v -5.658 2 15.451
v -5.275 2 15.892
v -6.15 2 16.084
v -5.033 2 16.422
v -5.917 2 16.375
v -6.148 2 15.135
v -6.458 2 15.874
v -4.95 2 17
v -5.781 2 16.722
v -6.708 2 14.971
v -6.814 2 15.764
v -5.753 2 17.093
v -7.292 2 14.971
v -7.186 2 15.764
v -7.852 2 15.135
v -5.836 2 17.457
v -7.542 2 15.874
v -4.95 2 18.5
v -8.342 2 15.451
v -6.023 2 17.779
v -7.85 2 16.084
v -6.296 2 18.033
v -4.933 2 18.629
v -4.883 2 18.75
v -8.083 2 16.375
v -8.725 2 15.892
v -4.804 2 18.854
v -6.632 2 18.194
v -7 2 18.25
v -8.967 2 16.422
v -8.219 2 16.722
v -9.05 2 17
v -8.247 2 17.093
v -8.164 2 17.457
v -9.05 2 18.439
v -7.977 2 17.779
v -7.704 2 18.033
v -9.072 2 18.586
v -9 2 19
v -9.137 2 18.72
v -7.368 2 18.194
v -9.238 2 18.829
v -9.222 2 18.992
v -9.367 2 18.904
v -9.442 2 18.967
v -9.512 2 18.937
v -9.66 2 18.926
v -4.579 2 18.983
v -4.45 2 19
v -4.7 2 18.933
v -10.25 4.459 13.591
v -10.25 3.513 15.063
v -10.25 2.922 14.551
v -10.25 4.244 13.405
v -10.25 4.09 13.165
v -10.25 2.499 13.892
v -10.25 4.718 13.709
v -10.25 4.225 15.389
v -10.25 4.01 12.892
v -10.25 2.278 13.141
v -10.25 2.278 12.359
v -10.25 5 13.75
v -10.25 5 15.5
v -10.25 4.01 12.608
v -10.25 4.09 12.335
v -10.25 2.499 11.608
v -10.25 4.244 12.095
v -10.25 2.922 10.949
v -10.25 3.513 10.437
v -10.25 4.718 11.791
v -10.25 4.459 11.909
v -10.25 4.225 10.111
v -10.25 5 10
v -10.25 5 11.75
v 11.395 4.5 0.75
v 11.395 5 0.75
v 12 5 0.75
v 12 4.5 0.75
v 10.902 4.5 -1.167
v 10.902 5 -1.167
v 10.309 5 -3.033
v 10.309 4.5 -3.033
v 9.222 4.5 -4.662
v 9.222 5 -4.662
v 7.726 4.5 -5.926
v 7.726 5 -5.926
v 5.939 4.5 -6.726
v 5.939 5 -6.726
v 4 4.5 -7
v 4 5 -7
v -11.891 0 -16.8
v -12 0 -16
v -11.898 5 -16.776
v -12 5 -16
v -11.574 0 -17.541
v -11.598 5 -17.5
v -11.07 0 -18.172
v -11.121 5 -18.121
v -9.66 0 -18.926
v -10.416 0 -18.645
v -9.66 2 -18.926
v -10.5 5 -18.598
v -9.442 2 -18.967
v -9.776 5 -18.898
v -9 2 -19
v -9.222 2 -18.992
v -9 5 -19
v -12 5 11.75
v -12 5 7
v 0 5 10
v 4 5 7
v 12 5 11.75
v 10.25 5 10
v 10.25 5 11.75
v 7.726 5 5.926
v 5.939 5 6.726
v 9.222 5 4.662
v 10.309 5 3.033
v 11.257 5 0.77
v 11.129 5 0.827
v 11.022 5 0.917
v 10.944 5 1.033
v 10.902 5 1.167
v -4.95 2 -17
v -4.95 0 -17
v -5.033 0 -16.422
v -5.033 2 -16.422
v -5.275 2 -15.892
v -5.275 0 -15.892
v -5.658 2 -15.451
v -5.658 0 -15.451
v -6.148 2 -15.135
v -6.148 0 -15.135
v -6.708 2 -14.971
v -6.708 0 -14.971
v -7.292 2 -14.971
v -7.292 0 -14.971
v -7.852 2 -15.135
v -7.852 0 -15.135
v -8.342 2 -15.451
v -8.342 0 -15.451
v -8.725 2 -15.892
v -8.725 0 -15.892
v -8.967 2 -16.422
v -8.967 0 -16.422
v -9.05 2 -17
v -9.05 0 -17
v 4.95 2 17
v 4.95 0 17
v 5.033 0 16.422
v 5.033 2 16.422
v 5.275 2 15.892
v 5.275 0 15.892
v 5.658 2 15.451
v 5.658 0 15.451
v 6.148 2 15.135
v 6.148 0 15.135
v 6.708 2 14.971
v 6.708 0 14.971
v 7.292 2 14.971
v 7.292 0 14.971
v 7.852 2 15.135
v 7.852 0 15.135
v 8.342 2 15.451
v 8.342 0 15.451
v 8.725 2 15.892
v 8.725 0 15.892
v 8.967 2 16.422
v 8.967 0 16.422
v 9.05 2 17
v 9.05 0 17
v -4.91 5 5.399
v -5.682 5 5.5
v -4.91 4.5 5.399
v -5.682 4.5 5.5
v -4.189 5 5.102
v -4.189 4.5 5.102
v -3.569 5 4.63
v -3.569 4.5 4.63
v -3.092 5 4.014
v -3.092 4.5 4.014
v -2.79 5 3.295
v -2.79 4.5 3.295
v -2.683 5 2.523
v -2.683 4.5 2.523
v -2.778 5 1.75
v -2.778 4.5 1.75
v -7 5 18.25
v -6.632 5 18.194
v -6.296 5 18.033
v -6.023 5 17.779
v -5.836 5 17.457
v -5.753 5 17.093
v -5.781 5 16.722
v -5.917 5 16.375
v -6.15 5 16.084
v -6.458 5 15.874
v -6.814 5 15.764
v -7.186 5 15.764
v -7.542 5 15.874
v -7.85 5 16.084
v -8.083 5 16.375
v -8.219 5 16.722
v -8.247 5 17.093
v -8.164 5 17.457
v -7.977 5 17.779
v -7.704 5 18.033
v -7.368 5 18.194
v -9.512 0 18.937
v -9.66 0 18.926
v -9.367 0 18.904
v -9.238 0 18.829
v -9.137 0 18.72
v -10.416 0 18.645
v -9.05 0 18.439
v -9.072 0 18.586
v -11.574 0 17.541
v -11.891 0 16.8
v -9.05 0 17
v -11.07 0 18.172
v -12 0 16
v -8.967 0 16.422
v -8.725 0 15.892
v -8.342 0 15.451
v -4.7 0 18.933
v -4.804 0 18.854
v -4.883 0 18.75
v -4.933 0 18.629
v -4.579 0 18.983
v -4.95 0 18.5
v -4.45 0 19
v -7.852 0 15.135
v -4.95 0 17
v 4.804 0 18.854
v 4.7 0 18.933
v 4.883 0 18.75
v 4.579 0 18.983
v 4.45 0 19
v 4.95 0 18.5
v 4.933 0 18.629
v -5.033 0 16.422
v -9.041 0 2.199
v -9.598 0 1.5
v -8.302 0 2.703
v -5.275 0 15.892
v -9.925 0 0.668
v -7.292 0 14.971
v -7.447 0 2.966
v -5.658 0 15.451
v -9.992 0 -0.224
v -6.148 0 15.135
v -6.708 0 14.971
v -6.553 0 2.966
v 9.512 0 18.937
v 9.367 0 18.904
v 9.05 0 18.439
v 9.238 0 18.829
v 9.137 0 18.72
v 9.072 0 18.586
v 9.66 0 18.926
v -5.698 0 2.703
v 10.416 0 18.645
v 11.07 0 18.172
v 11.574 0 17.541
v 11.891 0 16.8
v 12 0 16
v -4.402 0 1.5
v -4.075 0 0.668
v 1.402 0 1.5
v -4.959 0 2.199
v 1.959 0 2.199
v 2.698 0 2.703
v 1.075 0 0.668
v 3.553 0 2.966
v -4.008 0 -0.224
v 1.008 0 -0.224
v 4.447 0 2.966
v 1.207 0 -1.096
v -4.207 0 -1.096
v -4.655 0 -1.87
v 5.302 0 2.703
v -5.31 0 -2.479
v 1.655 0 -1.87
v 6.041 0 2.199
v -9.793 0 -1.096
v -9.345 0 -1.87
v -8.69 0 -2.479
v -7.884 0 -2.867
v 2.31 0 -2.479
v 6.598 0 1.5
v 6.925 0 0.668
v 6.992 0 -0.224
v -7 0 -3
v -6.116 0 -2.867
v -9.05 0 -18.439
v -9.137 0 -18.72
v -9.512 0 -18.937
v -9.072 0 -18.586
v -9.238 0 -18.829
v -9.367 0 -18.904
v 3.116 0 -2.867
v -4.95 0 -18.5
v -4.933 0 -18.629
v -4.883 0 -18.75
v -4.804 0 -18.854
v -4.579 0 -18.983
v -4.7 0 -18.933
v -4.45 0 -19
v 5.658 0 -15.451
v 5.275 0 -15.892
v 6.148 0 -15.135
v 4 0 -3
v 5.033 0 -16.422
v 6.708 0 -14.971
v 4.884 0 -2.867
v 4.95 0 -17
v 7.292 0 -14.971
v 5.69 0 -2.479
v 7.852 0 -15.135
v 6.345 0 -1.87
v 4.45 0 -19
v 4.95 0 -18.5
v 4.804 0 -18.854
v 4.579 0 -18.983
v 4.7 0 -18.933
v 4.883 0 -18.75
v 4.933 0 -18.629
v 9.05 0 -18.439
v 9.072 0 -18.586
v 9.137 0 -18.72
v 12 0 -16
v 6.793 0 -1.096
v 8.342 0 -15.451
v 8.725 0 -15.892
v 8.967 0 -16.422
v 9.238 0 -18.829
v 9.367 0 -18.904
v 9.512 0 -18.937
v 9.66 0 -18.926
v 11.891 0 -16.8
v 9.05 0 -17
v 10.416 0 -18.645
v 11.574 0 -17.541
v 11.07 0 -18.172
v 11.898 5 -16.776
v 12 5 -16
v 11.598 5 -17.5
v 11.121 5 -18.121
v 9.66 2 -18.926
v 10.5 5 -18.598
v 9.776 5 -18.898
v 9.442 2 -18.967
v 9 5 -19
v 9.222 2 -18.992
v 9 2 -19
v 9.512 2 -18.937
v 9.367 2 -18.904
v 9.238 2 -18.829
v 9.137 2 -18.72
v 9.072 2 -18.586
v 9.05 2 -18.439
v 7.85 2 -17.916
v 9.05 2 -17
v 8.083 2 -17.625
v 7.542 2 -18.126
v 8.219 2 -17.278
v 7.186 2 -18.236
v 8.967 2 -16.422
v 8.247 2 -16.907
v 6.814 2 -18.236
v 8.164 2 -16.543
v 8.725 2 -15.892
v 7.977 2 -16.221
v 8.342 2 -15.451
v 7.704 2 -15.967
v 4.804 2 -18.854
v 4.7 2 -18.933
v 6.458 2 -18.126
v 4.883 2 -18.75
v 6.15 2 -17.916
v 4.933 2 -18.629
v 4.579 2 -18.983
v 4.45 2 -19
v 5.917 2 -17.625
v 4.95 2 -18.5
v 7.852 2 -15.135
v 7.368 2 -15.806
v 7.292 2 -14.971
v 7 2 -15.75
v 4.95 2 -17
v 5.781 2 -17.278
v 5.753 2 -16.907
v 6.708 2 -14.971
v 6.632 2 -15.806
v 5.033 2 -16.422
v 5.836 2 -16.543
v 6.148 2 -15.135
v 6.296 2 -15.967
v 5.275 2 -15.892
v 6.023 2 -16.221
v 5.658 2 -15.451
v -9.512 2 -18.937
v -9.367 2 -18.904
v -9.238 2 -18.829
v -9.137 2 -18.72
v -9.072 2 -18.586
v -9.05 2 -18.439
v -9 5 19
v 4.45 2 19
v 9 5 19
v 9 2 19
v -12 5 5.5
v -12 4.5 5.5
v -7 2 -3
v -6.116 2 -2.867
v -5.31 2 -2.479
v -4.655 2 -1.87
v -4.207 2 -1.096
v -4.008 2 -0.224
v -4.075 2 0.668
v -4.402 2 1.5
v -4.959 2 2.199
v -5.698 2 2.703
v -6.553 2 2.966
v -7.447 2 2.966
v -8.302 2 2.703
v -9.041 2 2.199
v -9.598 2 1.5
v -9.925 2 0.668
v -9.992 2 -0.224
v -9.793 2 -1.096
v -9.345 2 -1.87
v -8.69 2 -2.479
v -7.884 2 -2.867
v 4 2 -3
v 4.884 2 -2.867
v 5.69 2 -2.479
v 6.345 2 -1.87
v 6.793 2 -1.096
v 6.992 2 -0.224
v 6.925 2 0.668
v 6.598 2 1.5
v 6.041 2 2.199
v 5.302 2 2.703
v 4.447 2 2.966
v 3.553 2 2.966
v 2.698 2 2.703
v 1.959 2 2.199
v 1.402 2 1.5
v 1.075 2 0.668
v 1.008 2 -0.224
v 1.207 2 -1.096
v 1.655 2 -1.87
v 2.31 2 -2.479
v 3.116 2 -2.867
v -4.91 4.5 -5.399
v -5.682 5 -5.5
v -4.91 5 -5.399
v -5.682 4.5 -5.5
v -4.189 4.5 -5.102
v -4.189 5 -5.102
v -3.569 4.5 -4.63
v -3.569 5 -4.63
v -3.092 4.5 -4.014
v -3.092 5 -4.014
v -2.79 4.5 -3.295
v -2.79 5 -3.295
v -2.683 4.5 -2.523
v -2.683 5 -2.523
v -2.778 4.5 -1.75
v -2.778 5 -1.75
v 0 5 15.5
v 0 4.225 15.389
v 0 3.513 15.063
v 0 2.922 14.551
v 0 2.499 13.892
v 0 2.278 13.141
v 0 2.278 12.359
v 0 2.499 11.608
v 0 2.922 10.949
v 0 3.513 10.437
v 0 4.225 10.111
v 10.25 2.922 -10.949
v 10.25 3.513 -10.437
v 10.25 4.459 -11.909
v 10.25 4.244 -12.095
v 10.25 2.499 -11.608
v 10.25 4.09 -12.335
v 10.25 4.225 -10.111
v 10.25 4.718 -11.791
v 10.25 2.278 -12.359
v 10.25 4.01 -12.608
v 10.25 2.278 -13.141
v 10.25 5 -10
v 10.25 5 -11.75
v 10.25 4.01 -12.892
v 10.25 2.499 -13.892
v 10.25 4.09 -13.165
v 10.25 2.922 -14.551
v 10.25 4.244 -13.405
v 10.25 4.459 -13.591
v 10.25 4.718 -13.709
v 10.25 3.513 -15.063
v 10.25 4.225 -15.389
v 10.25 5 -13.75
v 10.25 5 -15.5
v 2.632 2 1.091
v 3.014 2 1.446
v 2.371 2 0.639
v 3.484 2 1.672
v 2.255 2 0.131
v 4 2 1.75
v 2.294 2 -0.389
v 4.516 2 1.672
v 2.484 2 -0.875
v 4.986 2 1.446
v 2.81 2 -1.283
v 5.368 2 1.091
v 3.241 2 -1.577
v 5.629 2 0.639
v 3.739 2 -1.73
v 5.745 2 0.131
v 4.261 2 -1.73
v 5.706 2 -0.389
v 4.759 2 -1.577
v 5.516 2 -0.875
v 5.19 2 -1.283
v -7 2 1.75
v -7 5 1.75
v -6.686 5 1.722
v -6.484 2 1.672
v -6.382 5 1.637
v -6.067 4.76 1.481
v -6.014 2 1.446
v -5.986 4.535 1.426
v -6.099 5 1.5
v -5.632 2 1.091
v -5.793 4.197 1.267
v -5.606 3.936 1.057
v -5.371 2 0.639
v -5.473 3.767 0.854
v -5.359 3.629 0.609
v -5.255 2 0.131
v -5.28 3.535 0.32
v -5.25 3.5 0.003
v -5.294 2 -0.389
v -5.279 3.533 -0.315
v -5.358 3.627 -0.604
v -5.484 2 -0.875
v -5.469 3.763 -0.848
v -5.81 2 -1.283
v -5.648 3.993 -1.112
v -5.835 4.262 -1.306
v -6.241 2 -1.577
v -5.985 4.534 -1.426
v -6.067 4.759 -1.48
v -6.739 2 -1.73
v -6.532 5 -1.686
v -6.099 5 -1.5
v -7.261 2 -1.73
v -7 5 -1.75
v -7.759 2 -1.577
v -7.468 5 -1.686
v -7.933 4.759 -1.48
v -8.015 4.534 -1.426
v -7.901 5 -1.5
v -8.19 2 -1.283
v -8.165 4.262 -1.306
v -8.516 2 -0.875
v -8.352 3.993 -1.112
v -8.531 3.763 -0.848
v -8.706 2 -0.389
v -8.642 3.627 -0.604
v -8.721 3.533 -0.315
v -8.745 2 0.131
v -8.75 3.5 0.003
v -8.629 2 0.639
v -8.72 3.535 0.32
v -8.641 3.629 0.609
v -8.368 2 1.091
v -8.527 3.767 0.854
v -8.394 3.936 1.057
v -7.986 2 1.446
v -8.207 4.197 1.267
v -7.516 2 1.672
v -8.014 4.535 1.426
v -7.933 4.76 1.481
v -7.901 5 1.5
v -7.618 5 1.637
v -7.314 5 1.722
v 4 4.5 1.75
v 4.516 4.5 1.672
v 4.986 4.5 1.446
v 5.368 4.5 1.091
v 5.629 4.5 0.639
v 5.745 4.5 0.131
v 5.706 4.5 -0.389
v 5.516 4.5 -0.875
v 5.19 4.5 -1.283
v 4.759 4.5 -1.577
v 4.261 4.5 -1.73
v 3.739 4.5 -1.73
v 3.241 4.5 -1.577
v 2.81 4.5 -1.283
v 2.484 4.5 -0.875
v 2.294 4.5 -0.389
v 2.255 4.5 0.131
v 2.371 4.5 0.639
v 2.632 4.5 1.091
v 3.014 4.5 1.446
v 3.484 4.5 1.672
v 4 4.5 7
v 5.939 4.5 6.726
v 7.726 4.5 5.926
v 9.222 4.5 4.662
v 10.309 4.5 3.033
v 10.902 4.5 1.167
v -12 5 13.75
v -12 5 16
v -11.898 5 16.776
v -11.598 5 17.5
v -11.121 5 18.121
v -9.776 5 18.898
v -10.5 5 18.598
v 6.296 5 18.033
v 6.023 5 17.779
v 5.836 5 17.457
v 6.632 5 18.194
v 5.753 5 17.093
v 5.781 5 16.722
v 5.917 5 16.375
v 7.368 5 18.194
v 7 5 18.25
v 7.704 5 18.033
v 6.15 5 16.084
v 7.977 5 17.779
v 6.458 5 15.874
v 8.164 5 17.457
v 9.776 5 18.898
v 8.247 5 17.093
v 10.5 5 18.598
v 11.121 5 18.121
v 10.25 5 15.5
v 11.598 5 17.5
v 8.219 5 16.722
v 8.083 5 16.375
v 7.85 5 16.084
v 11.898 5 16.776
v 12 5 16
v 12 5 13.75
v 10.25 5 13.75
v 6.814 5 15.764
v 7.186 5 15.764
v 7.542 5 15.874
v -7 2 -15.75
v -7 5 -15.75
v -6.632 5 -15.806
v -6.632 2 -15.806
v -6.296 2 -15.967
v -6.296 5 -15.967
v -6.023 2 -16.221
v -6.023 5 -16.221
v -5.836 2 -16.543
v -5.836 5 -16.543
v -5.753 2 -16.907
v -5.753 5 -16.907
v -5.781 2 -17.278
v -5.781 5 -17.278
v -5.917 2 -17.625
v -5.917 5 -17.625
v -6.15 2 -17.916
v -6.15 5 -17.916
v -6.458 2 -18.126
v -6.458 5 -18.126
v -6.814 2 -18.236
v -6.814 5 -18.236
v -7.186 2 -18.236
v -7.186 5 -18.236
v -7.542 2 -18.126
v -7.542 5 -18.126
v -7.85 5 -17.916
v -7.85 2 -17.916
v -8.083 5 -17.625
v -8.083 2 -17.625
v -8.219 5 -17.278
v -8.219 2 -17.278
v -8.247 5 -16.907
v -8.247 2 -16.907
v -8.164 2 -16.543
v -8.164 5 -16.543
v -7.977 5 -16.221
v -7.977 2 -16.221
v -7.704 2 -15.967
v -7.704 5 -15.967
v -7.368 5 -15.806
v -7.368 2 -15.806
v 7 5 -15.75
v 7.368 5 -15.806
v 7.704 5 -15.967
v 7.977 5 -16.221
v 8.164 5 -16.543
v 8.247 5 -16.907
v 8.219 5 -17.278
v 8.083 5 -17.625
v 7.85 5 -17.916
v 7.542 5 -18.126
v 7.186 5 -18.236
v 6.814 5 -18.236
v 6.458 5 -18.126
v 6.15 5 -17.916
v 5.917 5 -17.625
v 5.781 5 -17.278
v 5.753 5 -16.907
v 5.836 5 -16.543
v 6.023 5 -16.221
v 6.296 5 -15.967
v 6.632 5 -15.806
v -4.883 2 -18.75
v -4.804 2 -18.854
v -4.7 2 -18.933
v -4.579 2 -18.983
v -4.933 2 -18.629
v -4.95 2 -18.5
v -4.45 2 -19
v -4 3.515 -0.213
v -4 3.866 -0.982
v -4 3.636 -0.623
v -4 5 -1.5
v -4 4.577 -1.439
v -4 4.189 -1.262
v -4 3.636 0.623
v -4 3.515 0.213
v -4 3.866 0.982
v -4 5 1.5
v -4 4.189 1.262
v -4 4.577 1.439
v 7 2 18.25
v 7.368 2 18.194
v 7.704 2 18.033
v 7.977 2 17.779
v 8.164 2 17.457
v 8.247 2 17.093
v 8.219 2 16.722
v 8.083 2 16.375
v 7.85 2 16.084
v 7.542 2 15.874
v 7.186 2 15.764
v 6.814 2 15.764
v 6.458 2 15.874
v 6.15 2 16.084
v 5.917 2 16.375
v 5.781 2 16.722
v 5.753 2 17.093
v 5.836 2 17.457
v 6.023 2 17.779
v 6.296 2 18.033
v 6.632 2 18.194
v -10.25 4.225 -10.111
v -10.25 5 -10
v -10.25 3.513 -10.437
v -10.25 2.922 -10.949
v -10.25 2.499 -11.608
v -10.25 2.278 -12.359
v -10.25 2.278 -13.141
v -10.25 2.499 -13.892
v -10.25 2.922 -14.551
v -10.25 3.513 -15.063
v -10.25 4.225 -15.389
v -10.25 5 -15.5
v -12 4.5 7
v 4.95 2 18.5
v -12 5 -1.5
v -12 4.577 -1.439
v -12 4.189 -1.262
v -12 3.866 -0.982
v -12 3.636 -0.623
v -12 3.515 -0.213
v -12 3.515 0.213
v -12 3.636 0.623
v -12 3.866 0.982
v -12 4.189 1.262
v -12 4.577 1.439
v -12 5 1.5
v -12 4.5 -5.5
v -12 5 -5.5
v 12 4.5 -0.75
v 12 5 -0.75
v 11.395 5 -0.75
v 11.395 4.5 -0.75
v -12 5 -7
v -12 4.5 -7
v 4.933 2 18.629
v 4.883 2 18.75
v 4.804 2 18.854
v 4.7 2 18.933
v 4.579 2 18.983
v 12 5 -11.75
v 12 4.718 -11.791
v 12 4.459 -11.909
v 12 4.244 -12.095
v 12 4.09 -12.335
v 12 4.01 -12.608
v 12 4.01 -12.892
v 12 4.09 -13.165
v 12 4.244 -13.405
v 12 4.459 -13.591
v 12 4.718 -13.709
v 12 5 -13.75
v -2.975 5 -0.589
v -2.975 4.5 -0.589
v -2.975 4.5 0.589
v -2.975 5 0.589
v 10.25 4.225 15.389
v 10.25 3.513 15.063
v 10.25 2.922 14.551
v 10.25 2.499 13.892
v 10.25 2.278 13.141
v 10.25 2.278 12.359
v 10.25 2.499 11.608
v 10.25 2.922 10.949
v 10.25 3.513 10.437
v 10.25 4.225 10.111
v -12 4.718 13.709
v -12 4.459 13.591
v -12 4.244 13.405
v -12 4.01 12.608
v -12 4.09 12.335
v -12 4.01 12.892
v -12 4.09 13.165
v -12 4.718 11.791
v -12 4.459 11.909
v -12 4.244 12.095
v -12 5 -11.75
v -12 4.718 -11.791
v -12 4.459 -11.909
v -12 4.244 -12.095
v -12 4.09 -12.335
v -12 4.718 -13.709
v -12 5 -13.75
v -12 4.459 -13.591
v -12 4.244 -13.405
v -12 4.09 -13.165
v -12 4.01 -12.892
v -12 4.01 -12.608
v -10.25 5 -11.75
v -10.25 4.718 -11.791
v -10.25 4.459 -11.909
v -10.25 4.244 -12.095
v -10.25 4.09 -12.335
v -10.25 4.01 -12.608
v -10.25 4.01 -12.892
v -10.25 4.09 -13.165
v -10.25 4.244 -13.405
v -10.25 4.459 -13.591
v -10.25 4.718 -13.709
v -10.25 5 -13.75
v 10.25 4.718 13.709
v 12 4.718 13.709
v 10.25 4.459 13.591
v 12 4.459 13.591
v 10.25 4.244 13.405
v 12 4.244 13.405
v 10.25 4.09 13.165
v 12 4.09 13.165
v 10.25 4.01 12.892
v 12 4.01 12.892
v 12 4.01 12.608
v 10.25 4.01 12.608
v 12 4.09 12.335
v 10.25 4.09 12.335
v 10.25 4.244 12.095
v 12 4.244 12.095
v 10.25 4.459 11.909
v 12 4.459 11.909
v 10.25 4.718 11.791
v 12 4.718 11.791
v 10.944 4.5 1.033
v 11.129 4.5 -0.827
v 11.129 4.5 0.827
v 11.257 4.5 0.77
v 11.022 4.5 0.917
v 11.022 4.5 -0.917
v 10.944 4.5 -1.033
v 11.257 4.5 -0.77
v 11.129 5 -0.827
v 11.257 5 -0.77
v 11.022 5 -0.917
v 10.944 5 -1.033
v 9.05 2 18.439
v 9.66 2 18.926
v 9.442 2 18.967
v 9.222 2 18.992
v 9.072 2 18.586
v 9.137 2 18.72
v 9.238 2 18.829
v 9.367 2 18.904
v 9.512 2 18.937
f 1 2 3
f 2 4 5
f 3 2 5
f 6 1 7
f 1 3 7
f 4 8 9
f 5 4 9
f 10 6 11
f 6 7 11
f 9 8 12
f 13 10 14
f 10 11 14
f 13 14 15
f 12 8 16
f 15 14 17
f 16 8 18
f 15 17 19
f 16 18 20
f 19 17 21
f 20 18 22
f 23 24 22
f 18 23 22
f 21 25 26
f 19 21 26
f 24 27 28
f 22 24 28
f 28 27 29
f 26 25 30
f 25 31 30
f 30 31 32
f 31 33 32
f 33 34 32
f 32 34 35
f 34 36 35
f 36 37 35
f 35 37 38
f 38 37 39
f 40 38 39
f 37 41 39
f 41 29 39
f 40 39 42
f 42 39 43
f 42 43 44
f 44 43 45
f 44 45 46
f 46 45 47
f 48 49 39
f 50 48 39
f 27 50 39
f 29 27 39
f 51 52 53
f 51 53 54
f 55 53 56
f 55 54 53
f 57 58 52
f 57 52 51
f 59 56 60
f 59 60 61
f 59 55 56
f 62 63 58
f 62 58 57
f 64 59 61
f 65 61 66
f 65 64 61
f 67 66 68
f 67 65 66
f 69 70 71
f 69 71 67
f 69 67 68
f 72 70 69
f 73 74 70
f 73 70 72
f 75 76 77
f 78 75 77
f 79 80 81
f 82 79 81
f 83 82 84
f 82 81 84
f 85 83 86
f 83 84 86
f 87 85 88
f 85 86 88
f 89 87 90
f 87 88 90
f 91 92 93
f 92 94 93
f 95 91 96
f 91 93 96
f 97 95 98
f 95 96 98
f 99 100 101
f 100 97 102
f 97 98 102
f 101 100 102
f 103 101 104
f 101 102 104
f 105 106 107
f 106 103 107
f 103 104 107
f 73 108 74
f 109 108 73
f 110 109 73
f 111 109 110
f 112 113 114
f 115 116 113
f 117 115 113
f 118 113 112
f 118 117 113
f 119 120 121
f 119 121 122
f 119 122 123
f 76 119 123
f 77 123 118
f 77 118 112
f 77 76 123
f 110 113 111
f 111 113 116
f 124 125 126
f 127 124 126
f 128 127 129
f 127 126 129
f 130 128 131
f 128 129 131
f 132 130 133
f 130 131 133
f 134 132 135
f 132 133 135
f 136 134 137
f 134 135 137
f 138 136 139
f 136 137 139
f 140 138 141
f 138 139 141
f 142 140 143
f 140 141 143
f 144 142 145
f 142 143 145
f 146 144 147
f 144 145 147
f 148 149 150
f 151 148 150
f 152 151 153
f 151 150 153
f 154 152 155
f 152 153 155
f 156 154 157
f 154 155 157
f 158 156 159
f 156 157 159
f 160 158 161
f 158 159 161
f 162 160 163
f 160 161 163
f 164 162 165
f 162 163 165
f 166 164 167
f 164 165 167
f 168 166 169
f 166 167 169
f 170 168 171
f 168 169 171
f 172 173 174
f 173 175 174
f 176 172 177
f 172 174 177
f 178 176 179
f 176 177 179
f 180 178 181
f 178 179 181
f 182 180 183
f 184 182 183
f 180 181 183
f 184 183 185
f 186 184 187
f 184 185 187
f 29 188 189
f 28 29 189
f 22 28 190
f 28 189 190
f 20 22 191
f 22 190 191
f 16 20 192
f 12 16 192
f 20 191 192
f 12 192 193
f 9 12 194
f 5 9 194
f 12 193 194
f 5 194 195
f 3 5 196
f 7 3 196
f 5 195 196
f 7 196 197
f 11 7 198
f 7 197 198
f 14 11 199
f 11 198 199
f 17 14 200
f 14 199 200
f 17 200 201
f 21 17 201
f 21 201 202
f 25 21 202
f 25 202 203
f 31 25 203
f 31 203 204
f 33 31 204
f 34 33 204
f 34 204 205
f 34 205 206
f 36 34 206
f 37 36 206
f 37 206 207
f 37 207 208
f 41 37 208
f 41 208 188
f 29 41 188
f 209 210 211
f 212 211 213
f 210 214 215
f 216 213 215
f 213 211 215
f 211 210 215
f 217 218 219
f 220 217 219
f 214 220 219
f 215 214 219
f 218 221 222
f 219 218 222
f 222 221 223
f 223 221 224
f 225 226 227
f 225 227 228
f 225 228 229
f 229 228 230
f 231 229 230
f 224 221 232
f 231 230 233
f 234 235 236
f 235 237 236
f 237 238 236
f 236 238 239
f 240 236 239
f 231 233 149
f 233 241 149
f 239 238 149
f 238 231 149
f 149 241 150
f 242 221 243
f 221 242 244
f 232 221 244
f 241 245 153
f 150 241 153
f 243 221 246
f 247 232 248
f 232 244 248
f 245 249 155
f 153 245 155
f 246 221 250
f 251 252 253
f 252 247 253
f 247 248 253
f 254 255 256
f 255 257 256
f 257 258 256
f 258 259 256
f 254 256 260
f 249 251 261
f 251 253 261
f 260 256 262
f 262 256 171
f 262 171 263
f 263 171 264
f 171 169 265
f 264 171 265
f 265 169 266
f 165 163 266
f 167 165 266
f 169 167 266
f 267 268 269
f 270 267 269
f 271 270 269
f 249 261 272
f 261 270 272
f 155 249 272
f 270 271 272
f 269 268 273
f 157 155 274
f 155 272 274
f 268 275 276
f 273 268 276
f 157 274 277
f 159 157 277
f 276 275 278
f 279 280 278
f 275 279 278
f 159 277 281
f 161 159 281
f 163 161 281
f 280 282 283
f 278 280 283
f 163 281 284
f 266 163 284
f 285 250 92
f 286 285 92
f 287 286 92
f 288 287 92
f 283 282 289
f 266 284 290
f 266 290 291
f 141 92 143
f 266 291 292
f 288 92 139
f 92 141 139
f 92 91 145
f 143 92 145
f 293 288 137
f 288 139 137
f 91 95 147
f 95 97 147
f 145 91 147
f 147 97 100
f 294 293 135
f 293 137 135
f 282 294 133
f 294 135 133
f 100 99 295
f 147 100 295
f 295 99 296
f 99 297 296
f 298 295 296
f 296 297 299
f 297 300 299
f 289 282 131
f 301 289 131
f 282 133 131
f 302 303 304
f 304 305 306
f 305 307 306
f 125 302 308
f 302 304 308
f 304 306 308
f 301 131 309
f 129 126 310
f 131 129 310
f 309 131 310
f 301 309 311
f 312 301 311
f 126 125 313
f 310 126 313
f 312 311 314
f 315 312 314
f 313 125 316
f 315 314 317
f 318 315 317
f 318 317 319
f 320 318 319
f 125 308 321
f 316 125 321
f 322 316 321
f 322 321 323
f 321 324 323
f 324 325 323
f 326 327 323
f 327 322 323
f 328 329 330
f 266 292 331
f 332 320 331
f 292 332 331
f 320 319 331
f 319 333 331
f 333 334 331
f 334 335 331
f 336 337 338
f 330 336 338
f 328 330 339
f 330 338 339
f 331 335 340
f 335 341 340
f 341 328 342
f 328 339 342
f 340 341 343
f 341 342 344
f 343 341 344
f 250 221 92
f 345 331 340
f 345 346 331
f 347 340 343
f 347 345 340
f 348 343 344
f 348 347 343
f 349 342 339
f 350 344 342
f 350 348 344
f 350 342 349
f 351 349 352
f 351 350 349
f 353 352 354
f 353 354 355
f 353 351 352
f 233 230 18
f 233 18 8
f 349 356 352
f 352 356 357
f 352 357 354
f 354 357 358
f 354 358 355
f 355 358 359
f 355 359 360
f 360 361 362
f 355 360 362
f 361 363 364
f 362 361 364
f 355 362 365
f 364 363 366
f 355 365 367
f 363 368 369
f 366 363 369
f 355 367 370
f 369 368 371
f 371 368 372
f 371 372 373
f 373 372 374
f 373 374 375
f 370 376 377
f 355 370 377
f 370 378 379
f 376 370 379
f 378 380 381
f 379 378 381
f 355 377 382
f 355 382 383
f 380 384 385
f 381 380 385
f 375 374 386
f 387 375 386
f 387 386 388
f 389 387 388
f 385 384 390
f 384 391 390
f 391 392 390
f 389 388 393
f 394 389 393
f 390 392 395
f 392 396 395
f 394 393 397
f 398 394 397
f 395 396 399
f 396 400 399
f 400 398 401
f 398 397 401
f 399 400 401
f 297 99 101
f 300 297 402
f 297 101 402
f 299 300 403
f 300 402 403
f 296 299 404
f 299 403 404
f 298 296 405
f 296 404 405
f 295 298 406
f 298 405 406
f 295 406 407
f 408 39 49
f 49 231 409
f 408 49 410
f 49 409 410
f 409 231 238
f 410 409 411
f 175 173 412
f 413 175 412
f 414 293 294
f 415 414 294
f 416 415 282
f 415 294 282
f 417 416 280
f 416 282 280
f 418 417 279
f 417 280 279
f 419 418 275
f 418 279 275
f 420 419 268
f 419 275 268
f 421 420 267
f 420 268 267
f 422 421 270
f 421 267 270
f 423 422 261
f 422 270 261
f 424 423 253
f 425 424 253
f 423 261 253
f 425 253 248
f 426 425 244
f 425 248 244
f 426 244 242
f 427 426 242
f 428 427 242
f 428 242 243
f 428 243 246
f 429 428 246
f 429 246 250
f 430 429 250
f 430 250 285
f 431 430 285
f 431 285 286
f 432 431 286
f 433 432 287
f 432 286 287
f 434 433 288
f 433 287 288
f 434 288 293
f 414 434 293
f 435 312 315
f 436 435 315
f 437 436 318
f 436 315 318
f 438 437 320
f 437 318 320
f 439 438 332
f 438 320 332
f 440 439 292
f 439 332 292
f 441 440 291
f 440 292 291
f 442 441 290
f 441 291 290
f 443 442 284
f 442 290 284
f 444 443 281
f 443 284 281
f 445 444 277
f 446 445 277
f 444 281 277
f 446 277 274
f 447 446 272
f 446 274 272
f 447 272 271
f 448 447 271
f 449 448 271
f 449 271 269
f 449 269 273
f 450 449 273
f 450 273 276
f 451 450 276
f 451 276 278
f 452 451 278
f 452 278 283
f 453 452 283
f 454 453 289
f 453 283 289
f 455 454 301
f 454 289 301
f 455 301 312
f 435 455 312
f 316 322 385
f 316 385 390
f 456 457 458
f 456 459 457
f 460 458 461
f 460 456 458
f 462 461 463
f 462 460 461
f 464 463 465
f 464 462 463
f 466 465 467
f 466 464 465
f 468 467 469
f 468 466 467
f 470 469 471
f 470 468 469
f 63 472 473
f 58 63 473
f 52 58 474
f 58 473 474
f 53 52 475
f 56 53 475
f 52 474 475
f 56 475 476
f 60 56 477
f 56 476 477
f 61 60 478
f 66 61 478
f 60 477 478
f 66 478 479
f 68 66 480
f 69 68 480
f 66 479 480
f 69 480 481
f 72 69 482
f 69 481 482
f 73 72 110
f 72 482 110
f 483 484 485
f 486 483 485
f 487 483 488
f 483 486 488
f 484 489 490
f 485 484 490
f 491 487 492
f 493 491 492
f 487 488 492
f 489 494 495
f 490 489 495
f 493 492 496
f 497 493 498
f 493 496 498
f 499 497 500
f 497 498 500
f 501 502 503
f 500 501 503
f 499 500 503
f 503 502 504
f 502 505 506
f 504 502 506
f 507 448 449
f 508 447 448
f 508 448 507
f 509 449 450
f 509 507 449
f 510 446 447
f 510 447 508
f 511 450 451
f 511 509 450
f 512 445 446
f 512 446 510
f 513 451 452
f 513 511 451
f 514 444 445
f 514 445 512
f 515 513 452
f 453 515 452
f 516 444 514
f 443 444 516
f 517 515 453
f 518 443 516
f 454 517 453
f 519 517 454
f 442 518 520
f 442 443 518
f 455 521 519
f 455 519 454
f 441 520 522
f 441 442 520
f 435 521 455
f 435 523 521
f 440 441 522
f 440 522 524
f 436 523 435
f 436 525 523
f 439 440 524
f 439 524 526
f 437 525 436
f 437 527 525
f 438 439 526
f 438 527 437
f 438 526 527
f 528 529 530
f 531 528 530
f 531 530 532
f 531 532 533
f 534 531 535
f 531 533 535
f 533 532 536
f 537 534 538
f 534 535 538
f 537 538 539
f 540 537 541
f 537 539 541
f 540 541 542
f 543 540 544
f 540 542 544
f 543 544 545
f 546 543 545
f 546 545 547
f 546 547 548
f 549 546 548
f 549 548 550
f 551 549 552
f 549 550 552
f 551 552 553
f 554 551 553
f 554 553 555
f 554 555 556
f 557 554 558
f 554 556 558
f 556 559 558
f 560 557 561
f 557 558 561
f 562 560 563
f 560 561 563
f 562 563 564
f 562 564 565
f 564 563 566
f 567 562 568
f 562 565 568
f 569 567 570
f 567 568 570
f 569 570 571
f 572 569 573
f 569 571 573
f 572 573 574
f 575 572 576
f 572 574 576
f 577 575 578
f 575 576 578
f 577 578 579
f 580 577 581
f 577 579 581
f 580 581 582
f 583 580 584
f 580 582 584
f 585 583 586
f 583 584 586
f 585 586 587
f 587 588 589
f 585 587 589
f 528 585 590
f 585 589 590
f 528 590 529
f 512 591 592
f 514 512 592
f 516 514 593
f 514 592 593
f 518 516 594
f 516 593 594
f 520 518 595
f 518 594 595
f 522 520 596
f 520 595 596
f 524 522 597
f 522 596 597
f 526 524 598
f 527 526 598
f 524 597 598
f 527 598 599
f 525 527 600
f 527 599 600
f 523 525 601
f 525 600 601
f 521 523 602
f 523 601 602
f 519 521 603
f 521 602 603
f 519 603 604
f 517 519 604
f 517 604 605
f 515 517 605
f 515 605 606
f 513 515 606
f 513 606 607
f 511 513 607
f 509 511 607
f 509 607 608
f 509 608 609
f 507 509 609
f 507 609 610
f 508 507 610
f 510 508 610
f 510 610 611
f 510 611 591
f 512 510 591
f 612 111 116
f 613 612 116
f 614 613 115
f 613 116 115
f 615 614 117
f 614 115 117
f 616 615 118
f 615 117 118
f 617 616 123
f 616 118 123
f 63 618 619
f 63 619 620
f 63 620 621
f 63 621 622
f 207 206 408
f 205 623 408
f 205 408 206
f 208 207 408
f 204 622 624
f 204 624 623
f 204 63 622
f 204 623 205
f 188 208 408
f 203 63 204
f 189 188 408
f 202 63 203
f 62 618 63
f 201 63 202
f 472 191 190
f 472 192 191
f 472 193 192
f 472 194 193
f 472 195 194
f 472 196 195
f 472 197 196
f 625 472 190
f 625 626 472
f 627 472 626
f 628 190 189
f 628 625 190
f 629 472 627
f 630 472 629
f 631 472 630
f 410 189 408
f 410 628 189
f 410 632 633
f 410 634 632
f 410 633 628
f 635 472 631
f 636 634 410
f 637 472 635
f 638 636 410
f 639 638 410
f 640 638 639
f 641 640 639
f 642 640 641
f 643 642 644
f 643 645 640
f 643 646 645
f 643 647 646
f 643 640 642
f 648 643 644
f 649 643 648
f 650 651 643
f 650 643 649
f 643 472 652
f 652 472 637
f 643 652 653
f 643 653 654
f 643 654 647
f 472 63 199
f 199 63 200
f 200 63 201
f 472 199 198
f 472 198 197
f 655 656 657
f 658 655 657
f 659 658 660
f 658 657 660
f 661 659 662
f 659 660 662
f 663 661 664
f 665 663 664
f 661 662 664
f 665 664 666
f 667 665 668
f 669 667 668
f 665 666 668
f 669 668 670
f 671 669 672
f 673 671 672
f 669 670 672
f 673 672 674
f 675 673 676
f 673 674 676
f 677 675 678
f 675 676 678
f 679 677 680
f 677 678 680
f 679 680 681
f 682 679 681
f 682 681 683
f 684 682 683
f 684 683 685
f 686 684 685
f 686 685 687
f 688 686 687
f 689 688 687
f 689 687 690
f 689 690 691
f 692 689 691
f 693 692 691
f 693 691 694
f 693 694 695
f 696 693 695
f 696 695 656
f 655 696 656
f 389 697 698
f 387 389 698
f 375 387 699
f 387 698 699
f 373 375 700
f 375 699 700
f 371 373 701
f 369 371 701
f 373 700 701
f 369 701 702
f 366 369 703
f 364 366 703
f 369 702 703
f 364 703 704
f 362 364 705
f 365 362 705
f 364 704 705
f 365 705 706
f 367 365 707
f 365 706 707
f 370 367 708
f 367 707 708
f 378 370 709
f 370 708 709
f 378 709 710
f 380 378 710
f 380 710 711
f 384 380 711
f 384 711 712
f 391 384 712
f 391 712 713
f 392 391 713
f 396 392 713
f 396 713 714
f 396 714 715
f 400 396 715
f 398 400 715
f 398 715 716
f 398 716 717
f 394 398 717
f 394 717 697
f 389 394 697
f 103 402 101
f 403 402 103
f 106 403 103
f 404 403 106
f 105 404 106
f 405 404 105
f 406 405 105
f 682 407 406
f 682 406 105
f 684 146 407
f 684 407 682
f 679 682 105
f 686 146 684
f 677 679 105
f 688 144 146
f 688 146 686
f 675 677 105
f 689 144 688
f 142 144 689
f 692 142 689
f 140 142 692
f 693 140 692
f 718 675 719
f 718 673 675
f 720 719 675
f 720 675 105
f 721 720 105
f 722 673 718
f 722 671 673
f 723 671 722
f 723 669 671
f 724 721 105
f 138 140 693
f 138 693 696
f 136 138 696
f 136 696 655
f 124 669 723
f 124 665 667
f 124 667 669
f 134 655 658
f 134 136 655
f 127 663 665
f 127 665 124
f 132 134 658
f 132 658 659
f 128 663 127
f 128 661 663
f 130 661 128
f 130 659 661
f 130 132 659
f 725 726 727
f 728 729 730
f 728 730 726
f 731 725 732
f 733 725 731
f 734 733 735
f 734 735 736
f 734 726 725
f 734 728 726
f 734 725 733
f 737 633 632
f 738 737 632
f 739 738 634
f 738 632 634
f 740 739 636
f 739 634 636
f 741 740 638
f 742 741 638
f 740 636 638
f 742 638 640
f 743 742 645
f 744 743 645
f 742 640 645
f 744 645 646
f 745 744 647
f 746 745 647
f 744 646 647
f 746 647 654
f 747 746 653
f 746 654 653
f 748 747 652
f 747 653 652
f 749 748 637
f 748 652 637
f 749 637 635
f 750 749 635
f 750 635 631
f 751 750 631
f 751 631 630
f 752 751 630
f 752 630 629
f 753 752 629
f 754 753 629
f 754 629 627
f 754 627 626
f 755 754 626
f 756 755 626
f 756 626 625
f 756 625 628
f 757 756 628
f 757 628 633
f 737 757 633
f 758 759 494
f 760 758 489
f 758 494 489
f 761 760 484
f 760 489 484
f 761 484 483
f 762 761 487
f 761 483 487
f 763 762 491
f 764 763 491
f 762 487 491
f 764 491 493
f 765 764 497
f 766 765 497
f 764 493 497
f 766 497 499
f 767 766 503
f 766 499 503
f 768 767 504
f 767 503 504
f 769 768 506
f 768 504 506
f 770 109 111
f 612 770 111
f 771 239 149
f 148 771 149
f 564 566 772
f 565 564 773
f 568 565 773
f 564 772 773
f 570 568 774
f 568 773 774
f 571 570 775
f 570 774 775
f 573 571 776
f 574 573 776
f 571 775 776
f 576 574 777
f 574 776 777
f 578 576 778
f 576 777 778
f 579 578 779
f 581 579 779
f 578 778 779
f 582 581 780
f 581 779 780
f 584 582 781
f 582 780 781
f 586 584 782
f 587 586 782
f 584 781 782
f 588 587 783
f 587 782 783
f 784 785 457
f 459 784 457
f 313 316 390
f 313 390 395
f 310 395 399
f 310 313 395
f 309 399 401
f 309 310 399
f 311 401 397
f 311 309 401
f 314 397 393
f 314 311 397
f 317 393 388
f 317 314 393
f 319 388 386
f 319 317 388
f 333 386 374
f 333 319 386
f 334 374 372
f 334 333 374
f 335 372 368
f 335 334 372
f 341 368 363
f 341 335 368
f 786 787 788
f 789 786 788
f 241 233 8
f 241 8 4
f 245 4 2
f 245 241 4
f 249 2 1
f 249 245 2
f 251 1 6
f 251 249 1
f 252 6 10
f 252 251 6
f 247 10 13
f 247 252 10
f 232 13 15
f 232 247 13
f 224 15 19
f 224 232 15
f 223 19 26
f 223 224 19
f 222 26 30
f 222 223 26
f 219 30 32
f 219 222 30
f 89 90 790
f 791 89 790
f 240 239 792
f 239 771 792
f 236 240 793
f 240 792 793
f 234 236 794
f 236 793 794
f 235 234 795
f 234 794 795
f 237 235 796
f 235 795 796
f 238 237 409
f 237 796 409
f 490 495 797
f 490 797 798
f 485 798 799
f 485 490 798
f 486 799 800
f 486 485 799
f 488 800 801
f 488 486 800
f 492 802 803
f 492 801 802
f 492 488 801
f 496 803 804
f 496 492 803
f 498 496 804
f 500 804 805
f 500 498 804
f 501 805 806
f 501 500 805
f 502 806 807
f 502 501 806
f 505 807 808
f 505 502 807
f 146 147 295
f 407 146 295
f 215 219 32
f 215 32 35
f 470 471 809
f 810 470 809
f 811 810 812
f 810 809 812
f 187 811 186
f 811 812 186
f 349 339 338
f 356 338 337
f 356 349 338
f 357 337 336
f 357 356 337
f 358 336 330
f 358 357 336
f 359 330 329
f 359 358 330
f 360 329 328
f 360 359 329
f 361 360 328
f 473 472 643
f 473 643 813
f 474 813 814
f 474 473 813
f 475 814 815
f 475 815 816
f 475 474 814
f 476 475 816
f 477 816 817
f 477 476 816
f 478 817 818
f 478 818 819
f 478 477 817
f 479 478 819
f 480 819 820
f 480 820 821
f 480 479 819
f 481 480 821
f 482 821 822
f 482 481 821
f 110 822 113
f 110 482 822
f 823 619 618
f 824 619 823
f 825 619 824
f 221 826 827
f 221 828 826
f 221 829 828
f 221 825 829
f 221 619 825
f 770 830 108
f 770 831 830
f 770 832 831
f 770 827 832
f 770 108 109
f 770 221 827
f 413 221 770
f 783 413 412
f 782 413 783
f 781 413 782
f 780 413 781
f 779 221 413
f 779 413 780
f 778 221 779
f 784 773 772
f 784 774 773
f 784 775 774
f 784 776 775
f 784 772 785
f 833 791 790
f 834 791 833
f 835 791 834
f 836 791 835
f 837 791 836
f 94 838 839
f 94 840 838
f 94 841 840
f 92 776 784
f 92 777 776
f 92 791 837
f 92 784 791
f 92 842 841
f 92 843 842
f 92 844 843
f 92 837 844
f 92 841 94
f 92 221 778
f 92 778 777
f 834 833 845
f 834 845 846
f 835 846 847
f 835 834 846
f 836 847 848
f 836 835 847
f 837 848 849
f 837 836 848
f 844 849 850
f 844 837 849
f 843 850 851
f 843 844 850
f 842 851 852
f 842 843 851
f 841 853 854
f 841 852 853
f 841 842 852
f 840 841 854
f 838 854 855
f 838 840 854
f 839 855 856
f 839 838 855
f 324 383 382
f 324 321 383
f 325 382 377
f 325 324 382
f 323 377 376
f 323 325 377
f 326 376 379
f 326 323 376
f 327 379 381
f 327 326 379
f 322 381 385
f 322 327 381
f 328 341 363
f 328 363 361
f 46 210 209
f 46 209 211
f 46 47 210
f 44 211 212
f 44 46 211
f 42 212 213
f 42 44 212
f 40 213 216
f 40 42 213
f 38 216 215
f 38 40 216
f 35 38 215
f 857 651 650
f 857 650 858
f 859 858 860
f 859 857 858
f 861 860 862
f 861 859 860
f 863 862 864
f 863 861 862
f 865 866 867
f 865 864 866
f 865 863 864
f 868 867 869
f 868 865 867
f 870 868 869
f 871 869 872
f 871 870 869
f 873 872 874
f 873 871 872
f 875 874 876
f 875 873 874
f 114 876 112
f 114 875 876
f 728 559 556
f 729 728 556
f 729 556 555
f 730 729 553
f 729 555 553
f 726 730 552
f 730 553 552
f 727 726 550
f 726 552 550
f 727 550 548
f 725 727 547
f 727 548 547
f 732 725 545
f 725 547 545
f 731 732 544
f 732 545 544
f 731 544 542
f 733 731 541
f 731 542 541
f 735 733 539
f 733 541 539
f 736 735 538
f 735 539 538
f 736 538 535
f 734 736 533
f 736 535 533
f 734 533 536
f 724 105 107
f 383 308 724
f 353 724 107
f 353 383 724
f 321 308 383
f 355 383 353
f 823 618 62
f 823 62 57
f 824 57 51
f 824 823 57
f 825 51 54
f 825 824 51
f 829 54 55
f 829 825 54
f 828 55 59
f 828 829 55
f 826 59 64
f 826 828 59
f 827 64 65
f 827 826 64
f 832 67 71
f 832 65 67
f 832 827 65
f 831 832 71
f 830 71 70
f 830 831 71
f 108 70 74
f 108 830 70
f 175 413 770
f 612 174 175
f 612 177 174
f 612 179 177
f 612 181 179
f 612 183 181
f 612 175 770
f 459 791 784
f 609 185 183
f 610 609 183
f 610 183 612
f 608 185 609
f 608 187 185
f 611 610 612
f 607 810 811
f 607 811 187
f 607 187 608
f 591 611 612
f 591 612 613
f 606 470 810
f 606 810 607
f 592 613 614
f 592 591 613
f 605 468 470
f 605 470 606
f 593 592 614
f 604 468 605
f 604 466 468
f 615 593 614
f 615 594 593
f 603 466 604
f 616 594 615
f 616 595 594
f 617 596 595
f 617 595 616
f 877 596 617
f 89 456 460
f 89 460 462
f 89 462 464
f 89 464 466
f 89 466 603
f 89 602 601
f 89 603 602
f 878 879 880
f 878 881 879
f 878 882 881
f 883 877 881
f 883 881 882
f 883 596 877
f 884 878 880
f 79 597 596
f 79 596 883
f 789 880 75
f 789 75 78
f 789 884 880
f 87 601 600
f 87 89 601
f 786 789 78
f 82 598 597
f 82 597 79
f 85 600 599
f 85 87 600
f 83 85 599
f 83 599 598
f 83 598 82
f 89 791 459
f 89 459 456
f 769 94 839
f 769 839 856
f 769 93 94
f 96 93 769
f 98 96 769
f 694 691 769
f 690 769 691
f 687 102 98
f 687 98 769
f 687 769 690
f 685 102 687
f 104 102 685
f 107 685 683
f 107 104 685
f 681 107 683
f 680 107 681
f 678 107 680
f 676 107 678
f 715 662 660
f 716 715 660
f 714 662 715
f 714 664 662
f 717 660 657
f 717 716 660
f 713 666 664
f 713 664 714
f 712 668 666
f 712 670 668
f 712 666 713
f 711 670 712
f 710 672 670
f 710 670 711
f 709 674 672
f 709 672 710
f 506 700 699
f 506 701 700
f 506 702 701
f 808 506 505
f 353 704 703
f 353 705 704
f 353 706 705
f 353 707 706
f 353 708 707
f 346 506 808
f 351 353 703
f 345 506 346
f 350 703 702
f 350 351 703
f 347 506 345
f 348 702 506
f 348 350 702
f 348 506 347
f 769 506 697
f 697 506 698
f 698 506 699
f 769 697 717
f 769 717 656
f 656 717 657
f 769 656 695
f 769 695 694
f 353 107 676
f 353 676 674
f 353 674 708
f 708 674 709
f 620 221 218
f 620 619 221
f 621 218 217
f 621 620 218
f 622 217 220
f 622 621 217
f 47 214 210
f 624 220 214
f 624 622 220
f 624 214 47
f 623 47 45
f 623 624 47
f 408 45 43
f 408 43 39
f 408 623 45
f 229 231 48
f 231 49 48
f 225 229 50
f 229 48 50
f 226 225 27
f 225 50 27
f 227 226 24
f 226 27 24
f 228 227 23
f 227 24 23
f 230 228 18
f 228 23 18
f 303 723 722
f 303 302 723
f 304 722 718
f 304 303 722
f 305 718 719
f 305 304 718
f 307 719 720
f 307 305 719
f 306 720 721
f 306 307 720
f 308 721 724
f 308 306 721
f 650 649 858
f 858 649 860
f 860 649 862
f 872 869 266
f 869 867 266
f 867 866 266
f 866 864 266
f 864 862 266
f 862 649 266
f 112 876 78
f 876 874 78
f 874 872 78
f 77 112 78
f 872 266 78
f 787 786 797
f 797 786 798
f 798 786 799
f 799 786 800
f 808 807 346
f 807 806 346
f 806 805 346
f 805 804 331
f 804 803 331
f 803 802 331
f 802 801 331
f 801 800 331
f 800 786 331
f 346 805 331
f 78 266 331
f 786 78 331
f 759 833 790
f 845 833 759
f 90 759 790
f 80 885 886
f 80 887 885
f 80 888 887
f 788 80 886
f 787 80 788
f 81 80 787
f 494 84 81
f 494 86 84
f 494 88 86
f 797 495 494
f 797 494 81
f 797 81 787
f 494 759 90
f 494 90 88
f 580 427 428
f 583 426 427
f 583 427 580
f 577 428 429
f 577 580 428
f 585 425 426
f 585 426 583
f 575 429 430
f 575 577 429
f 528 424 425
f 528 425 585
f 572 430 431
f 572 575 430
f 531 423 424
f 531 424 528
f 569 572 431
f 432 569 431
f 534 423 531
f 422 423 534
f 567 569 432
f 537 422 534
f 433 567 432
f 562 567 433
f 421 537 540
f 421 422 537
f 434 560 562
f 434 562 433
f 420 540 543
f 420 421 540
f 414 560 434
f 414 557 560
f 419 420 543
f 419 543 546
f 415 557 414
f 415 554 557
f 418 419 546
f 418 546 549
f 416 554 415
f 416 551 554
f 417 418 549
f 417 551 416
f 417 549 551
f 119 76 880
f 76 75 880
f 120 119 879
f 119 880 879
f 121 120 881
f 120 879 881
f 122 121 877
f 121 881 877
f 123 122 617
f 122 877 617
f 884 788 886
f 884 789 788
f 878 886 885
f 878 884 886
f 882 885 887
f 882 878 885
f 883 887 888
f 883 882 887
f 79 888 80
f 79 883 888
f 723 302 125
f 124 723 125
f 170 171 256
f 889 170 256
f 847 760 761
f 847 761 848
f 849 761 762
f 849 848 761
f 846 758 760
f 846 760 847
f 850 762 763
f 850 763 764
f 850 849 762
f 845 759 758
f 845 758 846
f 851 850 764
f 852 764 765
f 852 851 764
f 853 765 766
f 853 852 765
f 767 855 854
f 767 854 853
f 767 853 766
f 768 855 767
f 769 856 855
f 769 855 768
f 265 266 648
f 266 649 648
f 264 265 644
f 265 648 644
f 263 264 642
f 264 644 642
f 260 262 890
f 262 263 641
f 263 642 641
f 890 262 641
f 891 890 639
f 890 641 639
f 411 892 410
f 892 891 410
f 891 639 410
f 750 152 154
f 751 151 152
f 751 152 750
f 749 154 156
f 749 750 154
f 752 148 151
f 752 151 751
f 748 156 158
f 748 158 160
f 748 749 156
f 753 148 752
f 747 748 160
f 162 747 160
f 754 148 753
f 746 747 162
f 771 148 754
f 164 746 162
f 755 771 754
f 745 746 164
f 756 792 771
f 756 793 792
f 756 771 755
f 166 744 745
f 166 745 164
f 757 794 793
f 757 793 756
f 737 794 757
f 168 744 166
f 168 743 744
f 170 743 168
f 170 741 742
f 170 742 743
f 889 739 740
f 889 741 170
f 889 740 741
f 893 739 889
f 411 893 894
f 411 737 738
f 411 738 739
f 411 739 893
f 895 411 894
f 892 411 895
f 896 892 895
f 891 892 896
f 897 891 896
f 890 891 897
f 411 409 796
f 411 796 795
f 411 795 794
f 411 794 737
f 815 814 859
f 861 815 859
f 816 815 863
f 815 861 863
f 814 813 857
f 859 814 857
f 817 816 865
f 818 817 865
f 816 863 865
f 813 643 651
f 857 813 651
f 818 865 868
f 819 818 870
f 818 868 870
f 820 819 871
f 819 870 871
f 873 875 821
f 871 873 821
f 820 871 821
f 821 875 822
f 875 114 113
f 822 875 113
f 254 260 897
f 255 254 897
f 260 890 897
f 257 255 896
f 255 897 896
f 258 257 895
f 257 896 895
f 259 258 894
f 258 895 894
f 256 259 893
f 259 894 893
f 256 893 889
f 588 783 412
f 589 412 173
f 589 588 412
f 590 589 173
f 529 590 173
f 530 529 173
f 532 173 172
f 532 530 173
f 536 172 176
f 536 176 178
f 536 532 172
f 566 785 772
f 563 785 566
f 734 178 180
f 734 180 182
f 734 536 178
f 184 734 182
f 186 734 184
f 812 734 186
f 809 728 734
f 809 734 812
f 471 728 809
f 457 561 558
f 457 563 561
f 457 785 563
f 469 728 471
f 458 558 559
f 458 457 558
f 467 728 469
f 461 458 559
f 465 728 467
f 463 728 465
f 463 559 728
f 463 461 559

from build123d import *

# Parameters (mm, degrees)
SKETCH_1_W               = 24
SKETCH_1_H               = 38
EXTRUDE_1_DEPTH          = 5
SKETCH_2_R               = 2.75
CUT_EXTRUDE_1_DEPTH      = 10.25
CUT_EXTRUDE_2_DEPTH      = 24.021728866
CUT_EXTRUDE_2_DEPTH_BACK = 24.021728866
SKETCH_3_R               = 1
CUT_EXTRUDE_3_DEPTH      = 0.5
SKETCH_5_R               = 1.75
CUT_EXTRUDE_4_DEPTH      = 24.021728866
FILLET_1_R               = 3
FILLET_2_R               = 3
SKETCH_6_R               = 1.5
CUT_EXTRUDE_5_DEPTH      = 8
FILLET_3_R               = 0.5
SKETCH_7_R               = 1.25
CUT_EXTRUDE_6_DEPTH      = 24.02172894
SKETCH_8_R               = 3
CUT_EXTRUDE_7_DEPTH      = 2
CUT_EXTRUDE_8_DEPTH      = 2
FILLET_4_R               = 0.5


with BuildPart() as part:
    # Эскиз1 → Бобышка-Вытянуть1 (new body)
    with BuildSketch(Plane(origin=(0, 0, 0), x_dir=(1, 0, 0), z_dir=(0, 1, 0))):
        Rectangle(SKETCH_1_W, SKETCH_1_H)
    extrude(amount=EXTRUDE_1_DEPTH)

    # Эскиз2 → Вырез-Вытянуть1 (cut, symmetric)
    with BuildSketch(Plane(origin=(0, 0, 0), x_dir=(0, 0, -1), z_dir=(1, 0, 0))):
        with Locations((-12.75, 5)):
            Circle(SKETCH_2_R)
        with Locations((12.75, 5)):
            Circle(SKETCH_2_R)
    extrude(amount=CUT_EXTRUDE_1_DEPTH, both=True, mode=Mode.SUBTRACT)

    # Эскиз3 → Вырез-Вытянуть2 (cut, two sides: drawn at the far end of the back side and taken through both)
    with BuildSketch(Plane(origin=(0, 0, 0), x_dir=(0, 0, -1), z_dir=(1, 0, 0)).offset(-CUT_EXTRUDE_2_DEPTH_BACK)):
        with Locations((-12.75, 5)):
            Circle(SKETCH_3_R)
        with Locations((12.75, 5)):
            Circle(SKETCH_3_R)
    extrude(amount=CUT_EXTRUDE_2_DEPTH + CUT_EXTRUDE_2_DEPTH_BACK, mode=Mode.SUBTRACT)

    # Эскиз4 → Вырез-Вытянуть3 (cut)
    with BuildSketch(Plane(origin=(0, 5, 0), x_dir=(1, 0, 0), z_dir=(0, 1, 0))):
        with BuildLine():
            Line((4, 7), (-12, 7))
            Line((-12, 7), (-12, 5.5))
            Line((-12, 5.5), (-0.330127019, 5.5))
            ThreePointArc((-0.330127019, 5.5), (-3, 0), (-0.330127019, -5.5))
            Line((-0.330127019, -5.5), (-12, -5.5))
            Line((-12, -5.5), (-12, -7))
            Line((-12, -7), (4, -7))
            ThreePointArc((4, -7), (8.677071733, -5.208166664), (10.959705454, -0.75))
            Line((10.959705454, -0.75), (12, -0.75))
            Line((12, -0.75), (12, 0.75))
            Line((12, 0.75), (10.959705454, 0.75))
            ThreePointArc((10.959705454, 0.75), (8.677071733, 5.208166664), (4, 7))
        make_face()
    extrude(amount=-CUT_EXTRUDE_3_DEPTH, mode=Mode.SUBTRACT)

    # Эскиз5 → Вырез-Вытянуть4 (cut, through all)
    with BuildSketch(Plane(origin=(0, 5, 0), x_dir=(1, 0, 0), z_dir=(0, 1, 0))):
        with Locations(Location((4, 0, 0), (0, 0, 270))):
            Circle(SKETCH_5_R)
        with Locations(Location((-7, 0, 0), (0, 0, 270))):
            Circle(SKETCH_5_R)
    extrude(amount=-CUT_EXTRUDE_4_DEPTH, mode=Mode.SUBTRACT)

    # Скругление1
    fillet_1_edges = [part.edges().sort_by_distance(p)[0] for p in [
        (-0.330127019, 4.75, 5.5),
        (-0.330127019, 4.75, -5.5),
    ]]
    fillet(fillet_1_edges, radius=FILLET_1_R)

    # Скругление2
    fillet_2_edges = [part.edges().sort_by_distance(p)[0] for p in [
        (12, 2.5, 19),
        (-12, 2.5, 19),
        (-12, 2.5, -19),
        (12, 2.5, -19),
    ]]
    fillet(fillet_2_edges, radius=FILLET_2_R)

    # Эскиз6 → Вырез-Вытянуть5 (cut)
    with BuildSketch(Plane.ZY.offset(12)):
        with Locations((0, 5)):
            Circle(SKETCH_6_R)
    extrude(amount=-CUT_EXTRUDE_5_DEPTH, mode=Mode.SUBTRACT)

    # Скругление3
    fillet_3_edges = [part.edges().sort_by_distance(p)[0] for p in [
        (10.959705454, 4.75, -0.75),
        (10.959705454, 4.75, 0.75),
    ]]
    fillet(fillet_3_edges, radius=FILLET_3_R)

    # Эскиз7 → Вырез-Вытянуть6 (cut, through all)
    with BuildSketch(Plane(origin=(0, 5, 0), x_dir=(1, 0, 0), z_dir=(0, 1, 0))):
        with Locations(Location((-7, 17, 0), (0, 0, 270))):
            Circle(SKETCH_7_R)
        with Locations(Location((7, 17, 0), (0, 0, 270))):
            Circle(SKETCH_7_R)
        with Locations(Location((7, -17, 0), (0, 0, 270))):
            Circle(SKETCH_7_R)
        with Locations(Location((-7, -17, 0), (0, 0, 270))):
            Circle(SKETCH_7_R)
    extrude(amount=-CUT_EXTRUDE_6_DEPTH, mode=Mode.SUBTRACT)

    # Эскиз8 → Вырез-Вытянуть7 (cut)
    with BuildSketch(Plane.XZ):
        with Locations(Location((4, 0, 0), (0, 0, 270))):
            Circle(SKETCH_8_R)
        with Locations(Location((-7, 0, 0), (0, 0, 270))):
            Circle(SKETCH_8_R)
    extrude(amount=-CUT_EXTRUDE_7_DEPTH, mode=Mode.SUBTRACT)

    # Эскиз9 → Вырез-Вытянуть8 (cut)
    with BuildSketch(Plane.XZ):
        with BuildLine():
            Line((-9.05, 17), (-9.05, 20))
            Line((-9.05, 20), (-4.95, 20))
            Line((-4.95, 20), (-4.95, 17))
            ThreePointArc((-4.95, 17), (-7, 14.95), (-9.05, 17))
        make_face()
        with BuildLine():
            Line((9.05, 17), (9.05, 20))
            Line((9.05, 20), (4.95, 20))
            Line((4.95, 20), (4.95, 17))
            ThreePointArc((4.95, 17), (7, 14.95), (9.05, 17))
        make_face()
        with BuildLine():
            Line((4.95, -20), (4.95, -17))
            ThreePointArc((4.95, -17), (7, -14.95), (9.05, -17))
            Line((9.05, -17), (9.05, -20))
            Line((9.05, -20), (4.95, -20))
        make_face()
        with BuildLine():
            Line((-9.05, -17), (-9.05, -20))
            Line((-9.05, -20), (-4.95, -20))
            Line((-4.95, -20), (-4.95, -17))
            ThreePointArc((-4.95, -17), (-7, -14.95), (-9.05, -17))
        make_face()
    extrude(amount=-CUT_EXTRUDE_8_DEPTH, mode=Mode.SUBTRACT)

    # Скругление4
    fillet_4_edges = [part.edges().sort_by_distance(p)[0] for p in [
        (9.05, 1, 18.999583304),
        (-9.05, 1, 18.999583304),
        (9.05, 1, -18.999583304),
        (-9.05, 1, -18.999583304),
        (-4.95, 1, -19),
        (4.95, 1, -19),
        (4.95, 1, 19),
        (-4.95, 1, 19),
    ]]
    fillet(fillet_4_edges, radius=FILLET_4_R)


solid = part.part
